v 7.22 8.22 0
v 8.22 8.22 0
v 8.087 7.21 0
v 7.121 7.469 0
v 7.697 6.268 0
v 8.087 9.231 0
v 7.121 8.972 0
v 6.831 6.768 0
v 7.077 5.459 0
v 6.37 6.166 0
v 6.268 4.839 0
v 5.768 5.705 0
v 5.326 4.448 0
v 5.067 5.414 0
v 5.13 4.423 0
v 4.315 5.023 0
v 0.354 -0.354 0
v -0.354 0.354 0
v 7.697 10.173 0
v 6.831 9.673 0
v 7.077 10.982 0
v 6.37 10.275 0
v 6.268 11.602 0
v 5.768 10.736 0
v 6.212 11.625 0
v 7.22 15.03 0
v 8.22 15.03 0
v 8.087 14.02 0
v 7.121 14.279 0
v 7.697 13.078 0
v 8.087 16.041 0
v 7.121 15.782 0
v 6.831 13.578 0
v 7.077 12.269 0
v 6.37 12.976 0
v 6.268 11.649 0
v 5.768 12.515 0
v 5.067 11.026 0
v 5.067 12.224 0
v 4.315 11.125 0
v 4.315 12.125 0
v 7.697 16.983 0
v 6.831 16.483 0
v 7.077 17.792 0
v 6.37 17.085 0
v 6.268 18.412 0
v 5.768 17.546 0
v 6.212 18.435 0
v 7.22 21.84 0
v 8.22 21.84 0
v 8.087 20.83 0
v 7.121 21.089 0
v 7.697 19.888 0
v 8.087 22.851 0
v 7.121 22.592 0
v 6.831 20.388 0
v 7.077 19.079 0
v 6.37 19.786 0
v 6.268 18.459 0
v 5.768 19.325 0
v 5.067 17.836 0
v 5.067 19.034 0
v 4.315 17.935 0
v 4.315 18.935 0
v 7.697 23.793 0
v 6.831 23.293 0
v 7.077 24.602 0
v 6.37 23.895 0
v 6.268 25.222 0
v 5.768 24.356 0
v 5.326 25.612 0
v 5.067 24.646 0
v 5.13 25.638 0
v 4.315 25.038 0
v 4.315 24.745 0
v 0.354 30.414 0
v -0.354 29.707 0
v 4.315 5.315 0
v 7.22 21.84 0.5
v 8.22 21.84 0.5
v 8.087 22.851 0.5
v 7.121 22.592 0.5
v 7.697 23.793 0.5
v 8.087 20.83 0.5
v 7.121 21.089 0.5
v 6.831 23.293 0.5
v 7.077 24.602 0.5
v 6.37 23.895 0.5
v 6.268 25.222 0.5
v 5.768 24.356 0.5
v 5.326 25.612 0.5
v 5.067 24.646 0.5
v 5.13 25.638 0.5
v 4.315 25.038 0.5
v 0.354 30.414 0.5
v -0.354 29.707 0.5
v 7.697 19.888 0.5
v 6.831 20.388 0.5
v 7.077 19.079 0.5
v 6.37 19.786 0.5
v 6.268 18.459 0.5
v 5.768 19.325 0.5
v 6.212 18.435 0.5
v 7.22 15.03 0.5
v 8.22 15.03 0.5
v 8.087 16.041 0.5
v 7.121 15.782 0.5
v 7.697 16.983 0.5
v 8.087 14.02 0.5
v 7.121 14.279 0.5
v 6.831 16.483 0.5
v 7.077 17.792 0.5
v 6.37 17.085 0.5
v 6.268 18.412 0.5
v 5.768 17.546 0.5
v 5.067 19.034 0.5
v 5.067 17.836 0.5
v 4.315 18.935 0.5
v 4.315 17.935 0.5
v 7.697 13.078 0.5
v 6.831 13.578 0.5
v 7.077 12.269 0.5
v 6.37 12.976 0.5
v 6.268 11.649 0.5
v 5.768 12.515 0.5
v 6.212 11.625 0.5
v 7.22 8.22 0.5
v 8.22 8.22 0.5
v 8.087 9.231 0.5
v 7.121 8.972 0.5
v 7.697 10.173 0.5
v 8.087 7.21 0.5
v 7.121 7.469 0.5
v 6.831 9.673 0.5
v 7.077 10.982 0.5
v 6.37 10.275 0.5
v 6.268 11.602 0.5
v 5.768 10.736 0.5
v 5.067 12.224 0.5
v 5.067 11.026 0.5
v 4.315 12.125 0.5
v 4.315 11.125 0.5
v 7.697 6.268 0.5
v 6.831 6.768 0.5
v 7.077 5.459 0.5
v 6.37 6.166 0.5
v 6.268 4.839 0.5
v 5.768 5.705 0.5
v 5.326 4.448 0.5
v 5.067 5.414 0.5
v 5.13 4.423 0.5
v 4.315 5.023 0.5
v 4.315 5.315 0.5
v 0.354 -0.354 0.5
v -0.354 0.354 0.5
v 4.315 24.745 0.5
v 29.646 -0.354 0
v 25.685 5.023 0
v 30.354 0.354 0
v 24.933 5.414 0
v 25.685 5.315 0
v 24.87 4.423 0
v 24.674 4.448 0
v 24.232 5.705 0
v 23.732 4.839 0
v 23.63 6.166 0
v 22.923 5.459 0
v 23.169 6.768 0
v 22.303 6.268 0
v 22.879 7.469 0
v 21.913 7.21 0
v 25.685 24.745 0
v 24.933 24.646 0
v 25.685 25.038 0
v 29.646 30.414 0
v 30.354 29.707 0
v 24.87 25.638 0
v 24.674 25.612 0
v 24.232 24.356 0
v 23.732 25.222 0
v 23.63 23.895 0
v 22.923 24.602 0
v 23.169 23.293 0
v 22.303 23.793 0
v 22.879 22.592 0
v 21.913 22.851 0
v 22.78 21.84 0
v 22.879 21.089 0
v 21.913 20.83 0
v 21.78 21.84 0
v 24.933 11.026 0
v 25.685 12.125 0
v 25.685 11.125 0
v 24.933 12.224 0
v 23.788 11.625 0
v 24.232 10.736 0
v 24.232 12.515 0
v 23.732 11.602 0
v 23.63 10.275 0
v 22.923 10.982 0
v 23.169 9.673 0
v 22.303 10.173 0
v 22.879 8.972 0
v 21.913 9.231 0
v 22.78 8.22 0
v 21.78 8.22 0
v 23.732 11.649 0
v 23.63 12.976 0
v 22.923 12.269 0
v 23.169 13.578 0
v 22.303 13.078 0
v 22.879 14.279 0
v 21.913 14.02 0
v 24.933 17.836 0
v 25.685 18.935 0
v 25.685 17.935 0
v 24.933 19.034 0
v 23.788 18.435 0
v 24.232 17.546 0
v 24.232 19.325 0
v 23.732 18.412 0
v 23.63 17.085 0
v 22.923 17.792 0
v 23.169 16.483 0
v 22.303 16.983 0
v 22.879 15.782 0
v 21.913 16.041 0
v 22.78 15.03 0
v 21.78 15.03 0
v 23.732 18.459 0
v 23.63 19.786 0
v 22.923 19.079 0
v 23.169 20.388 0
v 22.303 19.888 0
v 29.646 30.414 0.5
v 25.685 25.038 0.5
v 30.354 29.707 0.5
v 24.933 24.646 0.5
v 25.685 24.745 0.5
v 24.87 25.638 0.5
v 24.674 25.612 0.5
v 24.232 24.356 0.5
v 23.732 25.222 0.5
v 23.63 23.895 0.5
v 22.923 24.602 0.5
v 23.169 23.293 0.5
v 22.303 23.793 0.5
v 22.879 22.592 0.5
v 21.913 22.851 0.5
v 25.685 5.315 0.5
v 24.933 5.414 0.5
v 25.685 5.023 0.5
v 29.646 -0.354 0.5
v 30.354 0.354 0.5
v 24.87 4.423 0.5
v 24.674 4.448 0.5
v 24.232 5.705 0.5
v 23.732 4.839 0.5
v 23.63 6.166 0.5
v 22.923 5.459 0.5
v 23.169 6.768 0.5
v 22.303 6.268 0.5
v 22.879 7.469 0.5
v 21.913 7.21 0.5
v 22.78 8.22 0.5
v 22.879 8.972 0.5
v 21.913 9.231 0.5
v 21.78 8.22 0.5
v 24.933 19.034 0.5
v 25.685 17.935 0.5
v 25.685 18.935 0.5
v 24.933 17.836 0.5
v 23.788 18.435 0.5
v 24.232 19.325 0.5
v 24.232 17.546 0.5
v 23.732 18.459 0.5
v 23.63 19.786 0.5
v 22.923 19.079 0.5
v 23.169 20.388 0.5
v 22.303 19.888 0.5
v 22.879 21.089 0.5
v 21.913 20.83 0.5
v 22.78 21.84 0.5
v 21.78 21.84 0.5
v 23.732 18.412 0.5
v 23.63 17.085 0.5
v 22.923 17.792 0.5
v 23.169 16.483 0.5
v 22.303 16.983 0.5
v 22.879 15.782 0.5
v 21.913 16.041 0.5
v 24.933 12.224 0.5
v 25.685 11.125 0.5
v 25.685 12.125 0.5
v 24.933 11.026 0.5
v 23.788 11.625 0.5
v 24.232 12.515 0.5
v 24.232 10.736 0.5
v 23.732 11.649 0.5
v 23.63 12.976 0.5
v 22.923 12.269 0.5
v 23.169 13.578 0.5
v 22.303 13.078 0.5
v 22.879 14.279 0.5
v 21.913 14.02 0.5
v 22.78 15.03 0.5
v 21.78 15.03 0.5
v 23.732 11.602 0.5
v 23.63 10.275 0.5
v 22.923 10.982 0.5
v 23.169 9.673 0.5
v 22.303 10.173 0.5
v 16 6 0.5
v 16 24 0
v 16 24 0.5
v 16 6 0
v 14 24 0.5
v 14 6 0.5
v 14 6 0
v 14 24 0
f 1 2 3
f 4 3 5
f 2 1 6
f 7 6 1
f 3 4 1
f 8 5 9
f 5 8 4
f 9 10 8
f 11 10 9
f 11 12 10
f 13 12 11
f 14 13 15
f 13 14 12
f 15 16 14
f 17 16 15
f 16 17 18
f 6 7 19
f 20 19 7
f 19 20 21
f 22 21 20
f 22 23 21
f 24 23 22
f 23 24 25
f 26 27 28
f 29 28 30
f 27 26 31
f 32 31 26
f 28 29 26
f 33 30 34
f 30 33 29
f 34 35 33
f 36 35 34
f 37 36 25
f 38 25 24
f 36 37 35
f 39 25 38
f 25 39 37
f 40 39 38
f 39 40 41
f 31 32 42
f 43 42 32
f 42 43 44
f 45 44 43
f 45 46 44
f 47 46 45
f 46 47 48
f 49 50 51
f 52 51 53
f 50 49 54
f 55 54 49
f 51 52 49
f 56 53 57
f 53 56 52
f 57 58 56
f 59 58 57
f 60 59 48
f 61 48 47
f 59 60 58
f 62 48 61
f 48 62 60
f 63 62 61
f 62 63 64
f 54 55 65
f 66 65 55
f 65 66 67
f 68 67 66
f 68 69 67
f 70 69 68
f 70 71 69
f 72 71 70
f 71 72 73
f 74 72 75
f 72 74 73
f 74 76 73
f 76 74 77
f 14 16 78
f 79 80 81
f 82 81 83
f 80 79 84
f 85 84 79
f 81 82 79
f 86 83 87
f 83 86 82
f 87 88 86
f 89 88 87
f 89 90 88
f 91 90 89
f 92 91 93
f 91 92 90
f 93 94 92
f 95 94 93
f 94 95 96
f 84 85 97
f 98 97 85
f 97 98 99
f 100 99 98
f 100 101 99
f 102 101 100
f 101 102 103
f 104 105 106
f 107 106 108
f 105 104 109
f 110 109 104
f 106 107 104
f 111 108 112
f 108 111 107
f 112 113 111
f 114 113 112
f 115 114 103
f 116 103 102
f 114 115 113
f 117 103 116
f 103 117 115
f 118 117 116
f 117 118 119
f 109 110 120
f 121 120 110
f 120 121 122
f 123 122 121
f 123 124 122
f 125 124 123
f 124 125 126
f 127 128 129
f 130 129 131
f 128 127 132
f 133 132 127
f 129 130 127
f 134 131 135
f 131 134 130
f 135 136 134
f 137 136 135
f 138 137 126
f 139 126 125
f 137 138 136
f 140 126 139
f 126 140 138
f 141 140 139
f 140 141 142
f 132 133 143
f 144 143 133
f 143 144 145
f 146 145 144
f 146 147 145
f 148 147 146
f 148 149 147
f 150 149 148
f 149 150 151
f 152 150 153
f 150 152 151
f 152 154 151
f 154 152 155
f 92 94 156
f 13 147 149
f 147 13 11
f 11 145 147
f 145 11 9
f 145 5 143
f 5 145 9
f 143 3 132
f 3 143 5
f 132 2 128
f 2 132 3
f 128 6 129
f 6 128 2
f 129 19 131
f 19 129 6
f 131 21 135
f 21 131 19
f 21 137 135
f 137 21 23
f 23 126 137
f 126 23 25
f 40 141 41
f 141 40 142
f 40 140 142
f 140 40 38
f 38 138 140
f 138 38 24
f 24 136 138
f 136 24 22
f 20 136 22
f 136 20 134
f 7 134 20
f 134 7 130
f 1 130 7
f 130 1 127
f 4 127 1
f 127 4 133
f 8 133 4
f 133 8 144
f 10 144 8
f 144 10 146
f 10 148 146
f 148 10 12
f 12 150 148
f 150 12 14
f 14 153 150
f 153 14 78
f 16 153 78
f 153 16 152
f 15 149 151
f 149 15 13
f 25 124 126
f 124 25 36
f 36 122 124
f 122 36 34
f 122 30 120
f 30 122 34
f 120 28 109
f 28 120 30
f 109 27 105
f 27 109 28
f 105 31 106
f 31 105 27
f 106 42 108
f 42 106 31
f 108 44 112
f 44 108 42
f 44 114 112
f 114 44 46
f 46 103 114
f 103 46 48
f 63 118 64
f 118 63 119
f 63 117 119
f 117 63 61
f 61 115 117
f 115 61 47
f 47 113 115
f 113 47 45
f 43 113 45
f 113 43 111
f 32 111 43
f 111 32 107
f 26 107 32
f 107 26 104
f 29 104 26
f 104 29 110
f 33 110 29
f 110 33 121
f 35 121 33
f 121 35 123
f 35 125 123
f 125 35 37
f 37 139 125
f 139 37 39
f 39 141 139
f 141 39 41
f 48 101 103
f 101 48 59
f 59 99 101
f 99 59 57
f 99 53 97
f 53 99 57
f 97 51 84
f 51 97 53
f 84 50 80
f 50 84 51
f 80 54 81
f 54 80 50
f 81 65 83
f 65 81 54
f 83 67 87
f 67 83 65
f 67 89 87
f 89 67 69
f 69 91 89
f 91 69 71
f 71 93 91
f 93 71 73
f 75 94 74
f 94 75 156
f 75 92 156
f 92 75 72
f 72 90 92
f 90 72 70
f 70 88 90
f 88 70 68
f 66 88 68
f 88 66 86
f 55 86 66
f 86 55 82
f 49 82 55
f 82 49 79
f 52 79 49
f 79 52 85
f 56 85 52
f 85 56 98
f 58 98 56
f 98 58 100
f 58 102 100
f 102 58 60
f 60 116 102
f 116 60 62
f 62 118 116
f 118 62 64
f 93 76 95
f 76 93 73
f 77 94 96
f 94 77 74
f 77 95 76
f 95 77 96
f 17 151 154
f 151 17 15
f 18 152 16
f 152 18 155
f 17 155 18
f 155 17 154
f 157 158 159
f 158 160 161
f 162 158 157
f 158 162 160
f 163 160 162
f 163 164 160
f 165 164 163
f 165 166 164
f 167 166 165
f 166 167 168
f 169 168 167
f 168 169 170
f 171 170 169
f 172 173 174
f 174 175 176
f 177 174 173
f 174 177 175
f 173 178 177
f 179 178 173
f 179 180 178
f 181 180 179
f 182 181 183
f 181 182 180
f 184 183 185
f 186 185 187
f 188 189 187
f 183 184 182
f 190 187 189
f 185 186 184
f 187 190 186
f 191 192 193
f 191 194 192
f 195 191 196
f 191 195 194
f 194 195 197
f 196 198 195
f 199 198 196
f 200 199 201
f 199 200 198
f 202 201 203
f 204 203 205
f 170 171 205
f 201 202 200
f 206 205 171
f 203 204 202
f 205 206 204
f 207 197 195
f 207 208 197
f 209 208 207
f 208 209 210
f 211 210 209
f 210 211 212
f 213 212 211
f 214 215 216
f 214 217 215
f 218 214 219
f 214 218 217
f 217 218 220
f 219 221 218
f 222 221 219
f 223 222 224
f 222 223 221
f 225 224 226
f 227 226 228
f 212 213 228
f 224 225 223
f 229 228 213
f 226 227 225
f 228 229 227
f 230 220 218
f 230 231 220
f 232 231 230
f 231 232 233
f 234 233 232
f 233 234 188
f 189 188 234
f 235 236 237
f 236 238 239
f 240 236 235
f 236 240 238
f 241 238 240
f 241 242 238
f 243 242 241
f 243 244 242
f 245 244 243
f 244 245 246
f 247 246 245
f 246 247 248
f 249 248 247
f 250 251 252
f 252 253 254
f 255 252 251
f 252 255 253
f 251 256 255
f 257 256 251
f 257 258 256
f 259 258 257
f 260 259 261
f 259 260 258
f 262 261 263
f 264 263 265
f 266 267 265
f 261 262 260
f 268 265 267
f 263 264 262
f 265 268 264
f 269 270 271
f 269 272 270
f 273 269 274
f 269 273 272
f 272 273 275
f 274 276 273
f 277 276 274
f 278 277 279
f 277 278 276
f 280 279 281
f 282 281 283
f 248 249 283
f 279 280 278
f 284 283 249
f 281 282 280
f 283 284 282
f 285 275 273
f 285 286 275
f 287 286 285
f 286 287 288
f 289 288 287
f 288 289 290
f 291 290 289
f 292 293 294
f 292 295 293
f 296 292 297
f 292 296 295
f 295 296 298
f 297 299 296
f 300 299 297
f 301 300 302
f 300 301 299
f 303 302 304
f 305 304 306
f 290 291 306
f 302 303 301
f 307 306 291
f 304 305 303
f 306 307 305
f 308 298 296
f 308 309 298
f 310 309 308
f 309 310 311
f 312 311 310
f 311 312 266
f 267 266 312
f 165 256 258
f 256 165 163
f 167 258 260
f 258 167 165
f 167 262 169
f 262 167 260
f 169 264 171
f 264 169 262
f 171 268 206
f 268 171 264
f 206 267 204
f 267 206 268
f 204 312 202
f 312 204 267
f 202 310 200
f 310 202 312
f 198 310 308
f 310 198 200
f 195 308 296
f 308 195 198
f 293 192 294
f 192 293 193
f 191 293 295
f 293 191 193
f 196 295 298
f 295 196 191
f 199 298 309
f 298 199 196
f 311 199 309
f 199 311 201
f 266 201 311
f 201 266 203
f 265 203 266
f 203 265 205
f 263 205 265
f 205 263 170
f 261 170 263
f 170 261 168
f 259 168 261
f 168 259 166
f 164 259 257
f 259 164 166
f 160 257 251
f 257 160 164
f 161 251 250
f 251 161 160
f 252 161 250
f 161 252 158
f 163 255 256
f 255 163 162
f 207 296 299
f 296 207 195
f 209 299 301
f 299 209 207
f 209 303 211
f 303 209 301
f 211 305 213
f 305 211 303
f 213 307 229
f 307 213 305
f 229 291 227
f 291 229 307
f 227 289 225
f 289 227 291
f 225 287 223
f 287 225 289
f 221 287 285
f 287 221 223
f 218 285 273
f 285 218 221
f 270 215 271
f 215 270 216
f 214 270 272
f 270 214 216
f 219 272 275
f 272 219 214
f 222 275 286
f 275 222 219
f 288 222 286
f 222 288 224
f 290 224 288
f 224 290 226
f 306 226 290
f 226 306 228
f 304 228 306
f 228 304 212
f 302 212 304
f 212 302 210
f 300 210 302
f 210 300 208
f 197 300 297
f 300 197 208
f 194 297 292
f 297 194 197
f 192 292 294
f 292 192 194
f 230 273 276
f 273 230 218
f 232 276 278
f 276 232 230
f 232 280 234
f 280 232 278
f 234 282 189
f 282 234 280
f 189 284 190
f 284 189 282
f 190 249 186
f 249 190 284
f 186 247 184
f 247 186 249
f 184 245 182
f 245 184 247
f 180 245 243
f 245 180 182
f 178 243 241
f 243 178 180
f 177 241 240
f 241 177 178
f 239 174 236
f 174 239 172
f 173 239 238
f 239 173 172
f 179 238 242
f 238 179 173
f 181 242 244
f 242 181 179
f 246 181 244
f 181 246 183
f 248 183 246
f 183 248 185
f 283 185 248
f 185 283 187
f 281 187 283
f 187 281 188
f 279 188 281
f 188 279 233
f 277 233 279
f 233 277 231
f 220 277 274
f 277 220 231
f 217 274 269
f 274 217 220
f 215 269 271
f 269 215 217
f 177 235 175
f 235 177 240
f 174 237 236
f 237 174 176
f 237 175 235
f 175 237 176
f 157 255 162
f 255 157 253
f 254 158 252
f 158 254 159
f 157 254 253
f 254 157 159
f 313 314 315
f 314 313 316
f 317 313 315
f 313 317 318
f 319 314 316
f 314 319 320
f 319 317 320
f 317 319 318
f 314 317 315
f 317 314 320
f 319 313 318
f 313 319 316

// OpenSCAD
// file: settings.scad
cube_width=30;
cube_height=16;
cube_thickness=3.3;

cap_width=30;
cap_height=6;
cap_thickness=3.3;

glyph_depth=0.7;
glyph_thickness=1.5;

photo_resitor_hole_r = 2.4;
spring_contact_hole_r = 3.125;
// file: sym_inductor.scad
module sector(radius, angles, fn = 24) {
    r = radius / cos(180 / fn);
    step = -360 / fn;

    points = concat([[0, 0]],
        [for(a = [angles[0] : step : angles[1] - 360]) 
            [r * cos(a), r * sin(a)]
        ],
        [[r * cos(angles[1]), r * sin(angles[1])]]
    );

    difference() {
        circle(radius, $fn = fn);
        polygon(points);
    }
}

module arc(radius, angles, width, fn = 24) {
    difference() {
        sector(radius + width/2, angles, fn);
        sector(radius - width/2, angles, fn);
    }
} 

module arc_3d(radius, angles, width, depth, fn)
{
    linear_extrude(depth) arc(radius, angles, width);
}

module sym_inductor(height, depth, thickness, angle)
{
    n1 = 3;
    //translate([0,-thickness/2,0]) cube([height/6, 2*thickness, depth]);
    r1 = height/(2*n1+4);
    
    rotate([0,0,-angle])translate([-thickness/2, 0, 0]) cube([thickness, 2*r1, depth]);
    
    translate([2*r1*sin(angle), 2*r1*cos(-angle), 0])
    {
        translate([-thickness/2, r1,0]) arc_3d(r1, [-90, 90], thickness, depth, 120);
    
        translate([-thickness/2,3*r1,0]) arc_3d(r1, [-90, 90], thickness, depth, 120);

        translate([-thickness/2,5*r1,0]) arc_3d(r1, [-90, 90], thickness, depth, 120);

        translate([0,6*r1,0]) rotate([0,0,angle]) translate([-thickness/2, 0, 0]) cube([thickness, 2*r1, depth]);
    }

    
    //translate([0,height-1.5*thickness,0]) cube([height/6, 2*thickness, depth]);
}

sym_inductor(30, 0.5, 1, 0);
// main file
use <sym_inductor.scad>
include <settings.scad>

module transformer_1_1(height, depth, thickness)
{
    sym_inductor(1.135*height, depth, thickness, 45);
    
    translate([height/2-thickness,height/5,0]) cube([2*thickness, 3*height/5, depth]);
    
    translate([height,0,0])mirror([1,0,0])sym_inductor(1.135*height, depth, thickness, 45);
}

//sym_inductor(30, 0.5, 1);
transformer_1_1(30, 0.5, 1);
